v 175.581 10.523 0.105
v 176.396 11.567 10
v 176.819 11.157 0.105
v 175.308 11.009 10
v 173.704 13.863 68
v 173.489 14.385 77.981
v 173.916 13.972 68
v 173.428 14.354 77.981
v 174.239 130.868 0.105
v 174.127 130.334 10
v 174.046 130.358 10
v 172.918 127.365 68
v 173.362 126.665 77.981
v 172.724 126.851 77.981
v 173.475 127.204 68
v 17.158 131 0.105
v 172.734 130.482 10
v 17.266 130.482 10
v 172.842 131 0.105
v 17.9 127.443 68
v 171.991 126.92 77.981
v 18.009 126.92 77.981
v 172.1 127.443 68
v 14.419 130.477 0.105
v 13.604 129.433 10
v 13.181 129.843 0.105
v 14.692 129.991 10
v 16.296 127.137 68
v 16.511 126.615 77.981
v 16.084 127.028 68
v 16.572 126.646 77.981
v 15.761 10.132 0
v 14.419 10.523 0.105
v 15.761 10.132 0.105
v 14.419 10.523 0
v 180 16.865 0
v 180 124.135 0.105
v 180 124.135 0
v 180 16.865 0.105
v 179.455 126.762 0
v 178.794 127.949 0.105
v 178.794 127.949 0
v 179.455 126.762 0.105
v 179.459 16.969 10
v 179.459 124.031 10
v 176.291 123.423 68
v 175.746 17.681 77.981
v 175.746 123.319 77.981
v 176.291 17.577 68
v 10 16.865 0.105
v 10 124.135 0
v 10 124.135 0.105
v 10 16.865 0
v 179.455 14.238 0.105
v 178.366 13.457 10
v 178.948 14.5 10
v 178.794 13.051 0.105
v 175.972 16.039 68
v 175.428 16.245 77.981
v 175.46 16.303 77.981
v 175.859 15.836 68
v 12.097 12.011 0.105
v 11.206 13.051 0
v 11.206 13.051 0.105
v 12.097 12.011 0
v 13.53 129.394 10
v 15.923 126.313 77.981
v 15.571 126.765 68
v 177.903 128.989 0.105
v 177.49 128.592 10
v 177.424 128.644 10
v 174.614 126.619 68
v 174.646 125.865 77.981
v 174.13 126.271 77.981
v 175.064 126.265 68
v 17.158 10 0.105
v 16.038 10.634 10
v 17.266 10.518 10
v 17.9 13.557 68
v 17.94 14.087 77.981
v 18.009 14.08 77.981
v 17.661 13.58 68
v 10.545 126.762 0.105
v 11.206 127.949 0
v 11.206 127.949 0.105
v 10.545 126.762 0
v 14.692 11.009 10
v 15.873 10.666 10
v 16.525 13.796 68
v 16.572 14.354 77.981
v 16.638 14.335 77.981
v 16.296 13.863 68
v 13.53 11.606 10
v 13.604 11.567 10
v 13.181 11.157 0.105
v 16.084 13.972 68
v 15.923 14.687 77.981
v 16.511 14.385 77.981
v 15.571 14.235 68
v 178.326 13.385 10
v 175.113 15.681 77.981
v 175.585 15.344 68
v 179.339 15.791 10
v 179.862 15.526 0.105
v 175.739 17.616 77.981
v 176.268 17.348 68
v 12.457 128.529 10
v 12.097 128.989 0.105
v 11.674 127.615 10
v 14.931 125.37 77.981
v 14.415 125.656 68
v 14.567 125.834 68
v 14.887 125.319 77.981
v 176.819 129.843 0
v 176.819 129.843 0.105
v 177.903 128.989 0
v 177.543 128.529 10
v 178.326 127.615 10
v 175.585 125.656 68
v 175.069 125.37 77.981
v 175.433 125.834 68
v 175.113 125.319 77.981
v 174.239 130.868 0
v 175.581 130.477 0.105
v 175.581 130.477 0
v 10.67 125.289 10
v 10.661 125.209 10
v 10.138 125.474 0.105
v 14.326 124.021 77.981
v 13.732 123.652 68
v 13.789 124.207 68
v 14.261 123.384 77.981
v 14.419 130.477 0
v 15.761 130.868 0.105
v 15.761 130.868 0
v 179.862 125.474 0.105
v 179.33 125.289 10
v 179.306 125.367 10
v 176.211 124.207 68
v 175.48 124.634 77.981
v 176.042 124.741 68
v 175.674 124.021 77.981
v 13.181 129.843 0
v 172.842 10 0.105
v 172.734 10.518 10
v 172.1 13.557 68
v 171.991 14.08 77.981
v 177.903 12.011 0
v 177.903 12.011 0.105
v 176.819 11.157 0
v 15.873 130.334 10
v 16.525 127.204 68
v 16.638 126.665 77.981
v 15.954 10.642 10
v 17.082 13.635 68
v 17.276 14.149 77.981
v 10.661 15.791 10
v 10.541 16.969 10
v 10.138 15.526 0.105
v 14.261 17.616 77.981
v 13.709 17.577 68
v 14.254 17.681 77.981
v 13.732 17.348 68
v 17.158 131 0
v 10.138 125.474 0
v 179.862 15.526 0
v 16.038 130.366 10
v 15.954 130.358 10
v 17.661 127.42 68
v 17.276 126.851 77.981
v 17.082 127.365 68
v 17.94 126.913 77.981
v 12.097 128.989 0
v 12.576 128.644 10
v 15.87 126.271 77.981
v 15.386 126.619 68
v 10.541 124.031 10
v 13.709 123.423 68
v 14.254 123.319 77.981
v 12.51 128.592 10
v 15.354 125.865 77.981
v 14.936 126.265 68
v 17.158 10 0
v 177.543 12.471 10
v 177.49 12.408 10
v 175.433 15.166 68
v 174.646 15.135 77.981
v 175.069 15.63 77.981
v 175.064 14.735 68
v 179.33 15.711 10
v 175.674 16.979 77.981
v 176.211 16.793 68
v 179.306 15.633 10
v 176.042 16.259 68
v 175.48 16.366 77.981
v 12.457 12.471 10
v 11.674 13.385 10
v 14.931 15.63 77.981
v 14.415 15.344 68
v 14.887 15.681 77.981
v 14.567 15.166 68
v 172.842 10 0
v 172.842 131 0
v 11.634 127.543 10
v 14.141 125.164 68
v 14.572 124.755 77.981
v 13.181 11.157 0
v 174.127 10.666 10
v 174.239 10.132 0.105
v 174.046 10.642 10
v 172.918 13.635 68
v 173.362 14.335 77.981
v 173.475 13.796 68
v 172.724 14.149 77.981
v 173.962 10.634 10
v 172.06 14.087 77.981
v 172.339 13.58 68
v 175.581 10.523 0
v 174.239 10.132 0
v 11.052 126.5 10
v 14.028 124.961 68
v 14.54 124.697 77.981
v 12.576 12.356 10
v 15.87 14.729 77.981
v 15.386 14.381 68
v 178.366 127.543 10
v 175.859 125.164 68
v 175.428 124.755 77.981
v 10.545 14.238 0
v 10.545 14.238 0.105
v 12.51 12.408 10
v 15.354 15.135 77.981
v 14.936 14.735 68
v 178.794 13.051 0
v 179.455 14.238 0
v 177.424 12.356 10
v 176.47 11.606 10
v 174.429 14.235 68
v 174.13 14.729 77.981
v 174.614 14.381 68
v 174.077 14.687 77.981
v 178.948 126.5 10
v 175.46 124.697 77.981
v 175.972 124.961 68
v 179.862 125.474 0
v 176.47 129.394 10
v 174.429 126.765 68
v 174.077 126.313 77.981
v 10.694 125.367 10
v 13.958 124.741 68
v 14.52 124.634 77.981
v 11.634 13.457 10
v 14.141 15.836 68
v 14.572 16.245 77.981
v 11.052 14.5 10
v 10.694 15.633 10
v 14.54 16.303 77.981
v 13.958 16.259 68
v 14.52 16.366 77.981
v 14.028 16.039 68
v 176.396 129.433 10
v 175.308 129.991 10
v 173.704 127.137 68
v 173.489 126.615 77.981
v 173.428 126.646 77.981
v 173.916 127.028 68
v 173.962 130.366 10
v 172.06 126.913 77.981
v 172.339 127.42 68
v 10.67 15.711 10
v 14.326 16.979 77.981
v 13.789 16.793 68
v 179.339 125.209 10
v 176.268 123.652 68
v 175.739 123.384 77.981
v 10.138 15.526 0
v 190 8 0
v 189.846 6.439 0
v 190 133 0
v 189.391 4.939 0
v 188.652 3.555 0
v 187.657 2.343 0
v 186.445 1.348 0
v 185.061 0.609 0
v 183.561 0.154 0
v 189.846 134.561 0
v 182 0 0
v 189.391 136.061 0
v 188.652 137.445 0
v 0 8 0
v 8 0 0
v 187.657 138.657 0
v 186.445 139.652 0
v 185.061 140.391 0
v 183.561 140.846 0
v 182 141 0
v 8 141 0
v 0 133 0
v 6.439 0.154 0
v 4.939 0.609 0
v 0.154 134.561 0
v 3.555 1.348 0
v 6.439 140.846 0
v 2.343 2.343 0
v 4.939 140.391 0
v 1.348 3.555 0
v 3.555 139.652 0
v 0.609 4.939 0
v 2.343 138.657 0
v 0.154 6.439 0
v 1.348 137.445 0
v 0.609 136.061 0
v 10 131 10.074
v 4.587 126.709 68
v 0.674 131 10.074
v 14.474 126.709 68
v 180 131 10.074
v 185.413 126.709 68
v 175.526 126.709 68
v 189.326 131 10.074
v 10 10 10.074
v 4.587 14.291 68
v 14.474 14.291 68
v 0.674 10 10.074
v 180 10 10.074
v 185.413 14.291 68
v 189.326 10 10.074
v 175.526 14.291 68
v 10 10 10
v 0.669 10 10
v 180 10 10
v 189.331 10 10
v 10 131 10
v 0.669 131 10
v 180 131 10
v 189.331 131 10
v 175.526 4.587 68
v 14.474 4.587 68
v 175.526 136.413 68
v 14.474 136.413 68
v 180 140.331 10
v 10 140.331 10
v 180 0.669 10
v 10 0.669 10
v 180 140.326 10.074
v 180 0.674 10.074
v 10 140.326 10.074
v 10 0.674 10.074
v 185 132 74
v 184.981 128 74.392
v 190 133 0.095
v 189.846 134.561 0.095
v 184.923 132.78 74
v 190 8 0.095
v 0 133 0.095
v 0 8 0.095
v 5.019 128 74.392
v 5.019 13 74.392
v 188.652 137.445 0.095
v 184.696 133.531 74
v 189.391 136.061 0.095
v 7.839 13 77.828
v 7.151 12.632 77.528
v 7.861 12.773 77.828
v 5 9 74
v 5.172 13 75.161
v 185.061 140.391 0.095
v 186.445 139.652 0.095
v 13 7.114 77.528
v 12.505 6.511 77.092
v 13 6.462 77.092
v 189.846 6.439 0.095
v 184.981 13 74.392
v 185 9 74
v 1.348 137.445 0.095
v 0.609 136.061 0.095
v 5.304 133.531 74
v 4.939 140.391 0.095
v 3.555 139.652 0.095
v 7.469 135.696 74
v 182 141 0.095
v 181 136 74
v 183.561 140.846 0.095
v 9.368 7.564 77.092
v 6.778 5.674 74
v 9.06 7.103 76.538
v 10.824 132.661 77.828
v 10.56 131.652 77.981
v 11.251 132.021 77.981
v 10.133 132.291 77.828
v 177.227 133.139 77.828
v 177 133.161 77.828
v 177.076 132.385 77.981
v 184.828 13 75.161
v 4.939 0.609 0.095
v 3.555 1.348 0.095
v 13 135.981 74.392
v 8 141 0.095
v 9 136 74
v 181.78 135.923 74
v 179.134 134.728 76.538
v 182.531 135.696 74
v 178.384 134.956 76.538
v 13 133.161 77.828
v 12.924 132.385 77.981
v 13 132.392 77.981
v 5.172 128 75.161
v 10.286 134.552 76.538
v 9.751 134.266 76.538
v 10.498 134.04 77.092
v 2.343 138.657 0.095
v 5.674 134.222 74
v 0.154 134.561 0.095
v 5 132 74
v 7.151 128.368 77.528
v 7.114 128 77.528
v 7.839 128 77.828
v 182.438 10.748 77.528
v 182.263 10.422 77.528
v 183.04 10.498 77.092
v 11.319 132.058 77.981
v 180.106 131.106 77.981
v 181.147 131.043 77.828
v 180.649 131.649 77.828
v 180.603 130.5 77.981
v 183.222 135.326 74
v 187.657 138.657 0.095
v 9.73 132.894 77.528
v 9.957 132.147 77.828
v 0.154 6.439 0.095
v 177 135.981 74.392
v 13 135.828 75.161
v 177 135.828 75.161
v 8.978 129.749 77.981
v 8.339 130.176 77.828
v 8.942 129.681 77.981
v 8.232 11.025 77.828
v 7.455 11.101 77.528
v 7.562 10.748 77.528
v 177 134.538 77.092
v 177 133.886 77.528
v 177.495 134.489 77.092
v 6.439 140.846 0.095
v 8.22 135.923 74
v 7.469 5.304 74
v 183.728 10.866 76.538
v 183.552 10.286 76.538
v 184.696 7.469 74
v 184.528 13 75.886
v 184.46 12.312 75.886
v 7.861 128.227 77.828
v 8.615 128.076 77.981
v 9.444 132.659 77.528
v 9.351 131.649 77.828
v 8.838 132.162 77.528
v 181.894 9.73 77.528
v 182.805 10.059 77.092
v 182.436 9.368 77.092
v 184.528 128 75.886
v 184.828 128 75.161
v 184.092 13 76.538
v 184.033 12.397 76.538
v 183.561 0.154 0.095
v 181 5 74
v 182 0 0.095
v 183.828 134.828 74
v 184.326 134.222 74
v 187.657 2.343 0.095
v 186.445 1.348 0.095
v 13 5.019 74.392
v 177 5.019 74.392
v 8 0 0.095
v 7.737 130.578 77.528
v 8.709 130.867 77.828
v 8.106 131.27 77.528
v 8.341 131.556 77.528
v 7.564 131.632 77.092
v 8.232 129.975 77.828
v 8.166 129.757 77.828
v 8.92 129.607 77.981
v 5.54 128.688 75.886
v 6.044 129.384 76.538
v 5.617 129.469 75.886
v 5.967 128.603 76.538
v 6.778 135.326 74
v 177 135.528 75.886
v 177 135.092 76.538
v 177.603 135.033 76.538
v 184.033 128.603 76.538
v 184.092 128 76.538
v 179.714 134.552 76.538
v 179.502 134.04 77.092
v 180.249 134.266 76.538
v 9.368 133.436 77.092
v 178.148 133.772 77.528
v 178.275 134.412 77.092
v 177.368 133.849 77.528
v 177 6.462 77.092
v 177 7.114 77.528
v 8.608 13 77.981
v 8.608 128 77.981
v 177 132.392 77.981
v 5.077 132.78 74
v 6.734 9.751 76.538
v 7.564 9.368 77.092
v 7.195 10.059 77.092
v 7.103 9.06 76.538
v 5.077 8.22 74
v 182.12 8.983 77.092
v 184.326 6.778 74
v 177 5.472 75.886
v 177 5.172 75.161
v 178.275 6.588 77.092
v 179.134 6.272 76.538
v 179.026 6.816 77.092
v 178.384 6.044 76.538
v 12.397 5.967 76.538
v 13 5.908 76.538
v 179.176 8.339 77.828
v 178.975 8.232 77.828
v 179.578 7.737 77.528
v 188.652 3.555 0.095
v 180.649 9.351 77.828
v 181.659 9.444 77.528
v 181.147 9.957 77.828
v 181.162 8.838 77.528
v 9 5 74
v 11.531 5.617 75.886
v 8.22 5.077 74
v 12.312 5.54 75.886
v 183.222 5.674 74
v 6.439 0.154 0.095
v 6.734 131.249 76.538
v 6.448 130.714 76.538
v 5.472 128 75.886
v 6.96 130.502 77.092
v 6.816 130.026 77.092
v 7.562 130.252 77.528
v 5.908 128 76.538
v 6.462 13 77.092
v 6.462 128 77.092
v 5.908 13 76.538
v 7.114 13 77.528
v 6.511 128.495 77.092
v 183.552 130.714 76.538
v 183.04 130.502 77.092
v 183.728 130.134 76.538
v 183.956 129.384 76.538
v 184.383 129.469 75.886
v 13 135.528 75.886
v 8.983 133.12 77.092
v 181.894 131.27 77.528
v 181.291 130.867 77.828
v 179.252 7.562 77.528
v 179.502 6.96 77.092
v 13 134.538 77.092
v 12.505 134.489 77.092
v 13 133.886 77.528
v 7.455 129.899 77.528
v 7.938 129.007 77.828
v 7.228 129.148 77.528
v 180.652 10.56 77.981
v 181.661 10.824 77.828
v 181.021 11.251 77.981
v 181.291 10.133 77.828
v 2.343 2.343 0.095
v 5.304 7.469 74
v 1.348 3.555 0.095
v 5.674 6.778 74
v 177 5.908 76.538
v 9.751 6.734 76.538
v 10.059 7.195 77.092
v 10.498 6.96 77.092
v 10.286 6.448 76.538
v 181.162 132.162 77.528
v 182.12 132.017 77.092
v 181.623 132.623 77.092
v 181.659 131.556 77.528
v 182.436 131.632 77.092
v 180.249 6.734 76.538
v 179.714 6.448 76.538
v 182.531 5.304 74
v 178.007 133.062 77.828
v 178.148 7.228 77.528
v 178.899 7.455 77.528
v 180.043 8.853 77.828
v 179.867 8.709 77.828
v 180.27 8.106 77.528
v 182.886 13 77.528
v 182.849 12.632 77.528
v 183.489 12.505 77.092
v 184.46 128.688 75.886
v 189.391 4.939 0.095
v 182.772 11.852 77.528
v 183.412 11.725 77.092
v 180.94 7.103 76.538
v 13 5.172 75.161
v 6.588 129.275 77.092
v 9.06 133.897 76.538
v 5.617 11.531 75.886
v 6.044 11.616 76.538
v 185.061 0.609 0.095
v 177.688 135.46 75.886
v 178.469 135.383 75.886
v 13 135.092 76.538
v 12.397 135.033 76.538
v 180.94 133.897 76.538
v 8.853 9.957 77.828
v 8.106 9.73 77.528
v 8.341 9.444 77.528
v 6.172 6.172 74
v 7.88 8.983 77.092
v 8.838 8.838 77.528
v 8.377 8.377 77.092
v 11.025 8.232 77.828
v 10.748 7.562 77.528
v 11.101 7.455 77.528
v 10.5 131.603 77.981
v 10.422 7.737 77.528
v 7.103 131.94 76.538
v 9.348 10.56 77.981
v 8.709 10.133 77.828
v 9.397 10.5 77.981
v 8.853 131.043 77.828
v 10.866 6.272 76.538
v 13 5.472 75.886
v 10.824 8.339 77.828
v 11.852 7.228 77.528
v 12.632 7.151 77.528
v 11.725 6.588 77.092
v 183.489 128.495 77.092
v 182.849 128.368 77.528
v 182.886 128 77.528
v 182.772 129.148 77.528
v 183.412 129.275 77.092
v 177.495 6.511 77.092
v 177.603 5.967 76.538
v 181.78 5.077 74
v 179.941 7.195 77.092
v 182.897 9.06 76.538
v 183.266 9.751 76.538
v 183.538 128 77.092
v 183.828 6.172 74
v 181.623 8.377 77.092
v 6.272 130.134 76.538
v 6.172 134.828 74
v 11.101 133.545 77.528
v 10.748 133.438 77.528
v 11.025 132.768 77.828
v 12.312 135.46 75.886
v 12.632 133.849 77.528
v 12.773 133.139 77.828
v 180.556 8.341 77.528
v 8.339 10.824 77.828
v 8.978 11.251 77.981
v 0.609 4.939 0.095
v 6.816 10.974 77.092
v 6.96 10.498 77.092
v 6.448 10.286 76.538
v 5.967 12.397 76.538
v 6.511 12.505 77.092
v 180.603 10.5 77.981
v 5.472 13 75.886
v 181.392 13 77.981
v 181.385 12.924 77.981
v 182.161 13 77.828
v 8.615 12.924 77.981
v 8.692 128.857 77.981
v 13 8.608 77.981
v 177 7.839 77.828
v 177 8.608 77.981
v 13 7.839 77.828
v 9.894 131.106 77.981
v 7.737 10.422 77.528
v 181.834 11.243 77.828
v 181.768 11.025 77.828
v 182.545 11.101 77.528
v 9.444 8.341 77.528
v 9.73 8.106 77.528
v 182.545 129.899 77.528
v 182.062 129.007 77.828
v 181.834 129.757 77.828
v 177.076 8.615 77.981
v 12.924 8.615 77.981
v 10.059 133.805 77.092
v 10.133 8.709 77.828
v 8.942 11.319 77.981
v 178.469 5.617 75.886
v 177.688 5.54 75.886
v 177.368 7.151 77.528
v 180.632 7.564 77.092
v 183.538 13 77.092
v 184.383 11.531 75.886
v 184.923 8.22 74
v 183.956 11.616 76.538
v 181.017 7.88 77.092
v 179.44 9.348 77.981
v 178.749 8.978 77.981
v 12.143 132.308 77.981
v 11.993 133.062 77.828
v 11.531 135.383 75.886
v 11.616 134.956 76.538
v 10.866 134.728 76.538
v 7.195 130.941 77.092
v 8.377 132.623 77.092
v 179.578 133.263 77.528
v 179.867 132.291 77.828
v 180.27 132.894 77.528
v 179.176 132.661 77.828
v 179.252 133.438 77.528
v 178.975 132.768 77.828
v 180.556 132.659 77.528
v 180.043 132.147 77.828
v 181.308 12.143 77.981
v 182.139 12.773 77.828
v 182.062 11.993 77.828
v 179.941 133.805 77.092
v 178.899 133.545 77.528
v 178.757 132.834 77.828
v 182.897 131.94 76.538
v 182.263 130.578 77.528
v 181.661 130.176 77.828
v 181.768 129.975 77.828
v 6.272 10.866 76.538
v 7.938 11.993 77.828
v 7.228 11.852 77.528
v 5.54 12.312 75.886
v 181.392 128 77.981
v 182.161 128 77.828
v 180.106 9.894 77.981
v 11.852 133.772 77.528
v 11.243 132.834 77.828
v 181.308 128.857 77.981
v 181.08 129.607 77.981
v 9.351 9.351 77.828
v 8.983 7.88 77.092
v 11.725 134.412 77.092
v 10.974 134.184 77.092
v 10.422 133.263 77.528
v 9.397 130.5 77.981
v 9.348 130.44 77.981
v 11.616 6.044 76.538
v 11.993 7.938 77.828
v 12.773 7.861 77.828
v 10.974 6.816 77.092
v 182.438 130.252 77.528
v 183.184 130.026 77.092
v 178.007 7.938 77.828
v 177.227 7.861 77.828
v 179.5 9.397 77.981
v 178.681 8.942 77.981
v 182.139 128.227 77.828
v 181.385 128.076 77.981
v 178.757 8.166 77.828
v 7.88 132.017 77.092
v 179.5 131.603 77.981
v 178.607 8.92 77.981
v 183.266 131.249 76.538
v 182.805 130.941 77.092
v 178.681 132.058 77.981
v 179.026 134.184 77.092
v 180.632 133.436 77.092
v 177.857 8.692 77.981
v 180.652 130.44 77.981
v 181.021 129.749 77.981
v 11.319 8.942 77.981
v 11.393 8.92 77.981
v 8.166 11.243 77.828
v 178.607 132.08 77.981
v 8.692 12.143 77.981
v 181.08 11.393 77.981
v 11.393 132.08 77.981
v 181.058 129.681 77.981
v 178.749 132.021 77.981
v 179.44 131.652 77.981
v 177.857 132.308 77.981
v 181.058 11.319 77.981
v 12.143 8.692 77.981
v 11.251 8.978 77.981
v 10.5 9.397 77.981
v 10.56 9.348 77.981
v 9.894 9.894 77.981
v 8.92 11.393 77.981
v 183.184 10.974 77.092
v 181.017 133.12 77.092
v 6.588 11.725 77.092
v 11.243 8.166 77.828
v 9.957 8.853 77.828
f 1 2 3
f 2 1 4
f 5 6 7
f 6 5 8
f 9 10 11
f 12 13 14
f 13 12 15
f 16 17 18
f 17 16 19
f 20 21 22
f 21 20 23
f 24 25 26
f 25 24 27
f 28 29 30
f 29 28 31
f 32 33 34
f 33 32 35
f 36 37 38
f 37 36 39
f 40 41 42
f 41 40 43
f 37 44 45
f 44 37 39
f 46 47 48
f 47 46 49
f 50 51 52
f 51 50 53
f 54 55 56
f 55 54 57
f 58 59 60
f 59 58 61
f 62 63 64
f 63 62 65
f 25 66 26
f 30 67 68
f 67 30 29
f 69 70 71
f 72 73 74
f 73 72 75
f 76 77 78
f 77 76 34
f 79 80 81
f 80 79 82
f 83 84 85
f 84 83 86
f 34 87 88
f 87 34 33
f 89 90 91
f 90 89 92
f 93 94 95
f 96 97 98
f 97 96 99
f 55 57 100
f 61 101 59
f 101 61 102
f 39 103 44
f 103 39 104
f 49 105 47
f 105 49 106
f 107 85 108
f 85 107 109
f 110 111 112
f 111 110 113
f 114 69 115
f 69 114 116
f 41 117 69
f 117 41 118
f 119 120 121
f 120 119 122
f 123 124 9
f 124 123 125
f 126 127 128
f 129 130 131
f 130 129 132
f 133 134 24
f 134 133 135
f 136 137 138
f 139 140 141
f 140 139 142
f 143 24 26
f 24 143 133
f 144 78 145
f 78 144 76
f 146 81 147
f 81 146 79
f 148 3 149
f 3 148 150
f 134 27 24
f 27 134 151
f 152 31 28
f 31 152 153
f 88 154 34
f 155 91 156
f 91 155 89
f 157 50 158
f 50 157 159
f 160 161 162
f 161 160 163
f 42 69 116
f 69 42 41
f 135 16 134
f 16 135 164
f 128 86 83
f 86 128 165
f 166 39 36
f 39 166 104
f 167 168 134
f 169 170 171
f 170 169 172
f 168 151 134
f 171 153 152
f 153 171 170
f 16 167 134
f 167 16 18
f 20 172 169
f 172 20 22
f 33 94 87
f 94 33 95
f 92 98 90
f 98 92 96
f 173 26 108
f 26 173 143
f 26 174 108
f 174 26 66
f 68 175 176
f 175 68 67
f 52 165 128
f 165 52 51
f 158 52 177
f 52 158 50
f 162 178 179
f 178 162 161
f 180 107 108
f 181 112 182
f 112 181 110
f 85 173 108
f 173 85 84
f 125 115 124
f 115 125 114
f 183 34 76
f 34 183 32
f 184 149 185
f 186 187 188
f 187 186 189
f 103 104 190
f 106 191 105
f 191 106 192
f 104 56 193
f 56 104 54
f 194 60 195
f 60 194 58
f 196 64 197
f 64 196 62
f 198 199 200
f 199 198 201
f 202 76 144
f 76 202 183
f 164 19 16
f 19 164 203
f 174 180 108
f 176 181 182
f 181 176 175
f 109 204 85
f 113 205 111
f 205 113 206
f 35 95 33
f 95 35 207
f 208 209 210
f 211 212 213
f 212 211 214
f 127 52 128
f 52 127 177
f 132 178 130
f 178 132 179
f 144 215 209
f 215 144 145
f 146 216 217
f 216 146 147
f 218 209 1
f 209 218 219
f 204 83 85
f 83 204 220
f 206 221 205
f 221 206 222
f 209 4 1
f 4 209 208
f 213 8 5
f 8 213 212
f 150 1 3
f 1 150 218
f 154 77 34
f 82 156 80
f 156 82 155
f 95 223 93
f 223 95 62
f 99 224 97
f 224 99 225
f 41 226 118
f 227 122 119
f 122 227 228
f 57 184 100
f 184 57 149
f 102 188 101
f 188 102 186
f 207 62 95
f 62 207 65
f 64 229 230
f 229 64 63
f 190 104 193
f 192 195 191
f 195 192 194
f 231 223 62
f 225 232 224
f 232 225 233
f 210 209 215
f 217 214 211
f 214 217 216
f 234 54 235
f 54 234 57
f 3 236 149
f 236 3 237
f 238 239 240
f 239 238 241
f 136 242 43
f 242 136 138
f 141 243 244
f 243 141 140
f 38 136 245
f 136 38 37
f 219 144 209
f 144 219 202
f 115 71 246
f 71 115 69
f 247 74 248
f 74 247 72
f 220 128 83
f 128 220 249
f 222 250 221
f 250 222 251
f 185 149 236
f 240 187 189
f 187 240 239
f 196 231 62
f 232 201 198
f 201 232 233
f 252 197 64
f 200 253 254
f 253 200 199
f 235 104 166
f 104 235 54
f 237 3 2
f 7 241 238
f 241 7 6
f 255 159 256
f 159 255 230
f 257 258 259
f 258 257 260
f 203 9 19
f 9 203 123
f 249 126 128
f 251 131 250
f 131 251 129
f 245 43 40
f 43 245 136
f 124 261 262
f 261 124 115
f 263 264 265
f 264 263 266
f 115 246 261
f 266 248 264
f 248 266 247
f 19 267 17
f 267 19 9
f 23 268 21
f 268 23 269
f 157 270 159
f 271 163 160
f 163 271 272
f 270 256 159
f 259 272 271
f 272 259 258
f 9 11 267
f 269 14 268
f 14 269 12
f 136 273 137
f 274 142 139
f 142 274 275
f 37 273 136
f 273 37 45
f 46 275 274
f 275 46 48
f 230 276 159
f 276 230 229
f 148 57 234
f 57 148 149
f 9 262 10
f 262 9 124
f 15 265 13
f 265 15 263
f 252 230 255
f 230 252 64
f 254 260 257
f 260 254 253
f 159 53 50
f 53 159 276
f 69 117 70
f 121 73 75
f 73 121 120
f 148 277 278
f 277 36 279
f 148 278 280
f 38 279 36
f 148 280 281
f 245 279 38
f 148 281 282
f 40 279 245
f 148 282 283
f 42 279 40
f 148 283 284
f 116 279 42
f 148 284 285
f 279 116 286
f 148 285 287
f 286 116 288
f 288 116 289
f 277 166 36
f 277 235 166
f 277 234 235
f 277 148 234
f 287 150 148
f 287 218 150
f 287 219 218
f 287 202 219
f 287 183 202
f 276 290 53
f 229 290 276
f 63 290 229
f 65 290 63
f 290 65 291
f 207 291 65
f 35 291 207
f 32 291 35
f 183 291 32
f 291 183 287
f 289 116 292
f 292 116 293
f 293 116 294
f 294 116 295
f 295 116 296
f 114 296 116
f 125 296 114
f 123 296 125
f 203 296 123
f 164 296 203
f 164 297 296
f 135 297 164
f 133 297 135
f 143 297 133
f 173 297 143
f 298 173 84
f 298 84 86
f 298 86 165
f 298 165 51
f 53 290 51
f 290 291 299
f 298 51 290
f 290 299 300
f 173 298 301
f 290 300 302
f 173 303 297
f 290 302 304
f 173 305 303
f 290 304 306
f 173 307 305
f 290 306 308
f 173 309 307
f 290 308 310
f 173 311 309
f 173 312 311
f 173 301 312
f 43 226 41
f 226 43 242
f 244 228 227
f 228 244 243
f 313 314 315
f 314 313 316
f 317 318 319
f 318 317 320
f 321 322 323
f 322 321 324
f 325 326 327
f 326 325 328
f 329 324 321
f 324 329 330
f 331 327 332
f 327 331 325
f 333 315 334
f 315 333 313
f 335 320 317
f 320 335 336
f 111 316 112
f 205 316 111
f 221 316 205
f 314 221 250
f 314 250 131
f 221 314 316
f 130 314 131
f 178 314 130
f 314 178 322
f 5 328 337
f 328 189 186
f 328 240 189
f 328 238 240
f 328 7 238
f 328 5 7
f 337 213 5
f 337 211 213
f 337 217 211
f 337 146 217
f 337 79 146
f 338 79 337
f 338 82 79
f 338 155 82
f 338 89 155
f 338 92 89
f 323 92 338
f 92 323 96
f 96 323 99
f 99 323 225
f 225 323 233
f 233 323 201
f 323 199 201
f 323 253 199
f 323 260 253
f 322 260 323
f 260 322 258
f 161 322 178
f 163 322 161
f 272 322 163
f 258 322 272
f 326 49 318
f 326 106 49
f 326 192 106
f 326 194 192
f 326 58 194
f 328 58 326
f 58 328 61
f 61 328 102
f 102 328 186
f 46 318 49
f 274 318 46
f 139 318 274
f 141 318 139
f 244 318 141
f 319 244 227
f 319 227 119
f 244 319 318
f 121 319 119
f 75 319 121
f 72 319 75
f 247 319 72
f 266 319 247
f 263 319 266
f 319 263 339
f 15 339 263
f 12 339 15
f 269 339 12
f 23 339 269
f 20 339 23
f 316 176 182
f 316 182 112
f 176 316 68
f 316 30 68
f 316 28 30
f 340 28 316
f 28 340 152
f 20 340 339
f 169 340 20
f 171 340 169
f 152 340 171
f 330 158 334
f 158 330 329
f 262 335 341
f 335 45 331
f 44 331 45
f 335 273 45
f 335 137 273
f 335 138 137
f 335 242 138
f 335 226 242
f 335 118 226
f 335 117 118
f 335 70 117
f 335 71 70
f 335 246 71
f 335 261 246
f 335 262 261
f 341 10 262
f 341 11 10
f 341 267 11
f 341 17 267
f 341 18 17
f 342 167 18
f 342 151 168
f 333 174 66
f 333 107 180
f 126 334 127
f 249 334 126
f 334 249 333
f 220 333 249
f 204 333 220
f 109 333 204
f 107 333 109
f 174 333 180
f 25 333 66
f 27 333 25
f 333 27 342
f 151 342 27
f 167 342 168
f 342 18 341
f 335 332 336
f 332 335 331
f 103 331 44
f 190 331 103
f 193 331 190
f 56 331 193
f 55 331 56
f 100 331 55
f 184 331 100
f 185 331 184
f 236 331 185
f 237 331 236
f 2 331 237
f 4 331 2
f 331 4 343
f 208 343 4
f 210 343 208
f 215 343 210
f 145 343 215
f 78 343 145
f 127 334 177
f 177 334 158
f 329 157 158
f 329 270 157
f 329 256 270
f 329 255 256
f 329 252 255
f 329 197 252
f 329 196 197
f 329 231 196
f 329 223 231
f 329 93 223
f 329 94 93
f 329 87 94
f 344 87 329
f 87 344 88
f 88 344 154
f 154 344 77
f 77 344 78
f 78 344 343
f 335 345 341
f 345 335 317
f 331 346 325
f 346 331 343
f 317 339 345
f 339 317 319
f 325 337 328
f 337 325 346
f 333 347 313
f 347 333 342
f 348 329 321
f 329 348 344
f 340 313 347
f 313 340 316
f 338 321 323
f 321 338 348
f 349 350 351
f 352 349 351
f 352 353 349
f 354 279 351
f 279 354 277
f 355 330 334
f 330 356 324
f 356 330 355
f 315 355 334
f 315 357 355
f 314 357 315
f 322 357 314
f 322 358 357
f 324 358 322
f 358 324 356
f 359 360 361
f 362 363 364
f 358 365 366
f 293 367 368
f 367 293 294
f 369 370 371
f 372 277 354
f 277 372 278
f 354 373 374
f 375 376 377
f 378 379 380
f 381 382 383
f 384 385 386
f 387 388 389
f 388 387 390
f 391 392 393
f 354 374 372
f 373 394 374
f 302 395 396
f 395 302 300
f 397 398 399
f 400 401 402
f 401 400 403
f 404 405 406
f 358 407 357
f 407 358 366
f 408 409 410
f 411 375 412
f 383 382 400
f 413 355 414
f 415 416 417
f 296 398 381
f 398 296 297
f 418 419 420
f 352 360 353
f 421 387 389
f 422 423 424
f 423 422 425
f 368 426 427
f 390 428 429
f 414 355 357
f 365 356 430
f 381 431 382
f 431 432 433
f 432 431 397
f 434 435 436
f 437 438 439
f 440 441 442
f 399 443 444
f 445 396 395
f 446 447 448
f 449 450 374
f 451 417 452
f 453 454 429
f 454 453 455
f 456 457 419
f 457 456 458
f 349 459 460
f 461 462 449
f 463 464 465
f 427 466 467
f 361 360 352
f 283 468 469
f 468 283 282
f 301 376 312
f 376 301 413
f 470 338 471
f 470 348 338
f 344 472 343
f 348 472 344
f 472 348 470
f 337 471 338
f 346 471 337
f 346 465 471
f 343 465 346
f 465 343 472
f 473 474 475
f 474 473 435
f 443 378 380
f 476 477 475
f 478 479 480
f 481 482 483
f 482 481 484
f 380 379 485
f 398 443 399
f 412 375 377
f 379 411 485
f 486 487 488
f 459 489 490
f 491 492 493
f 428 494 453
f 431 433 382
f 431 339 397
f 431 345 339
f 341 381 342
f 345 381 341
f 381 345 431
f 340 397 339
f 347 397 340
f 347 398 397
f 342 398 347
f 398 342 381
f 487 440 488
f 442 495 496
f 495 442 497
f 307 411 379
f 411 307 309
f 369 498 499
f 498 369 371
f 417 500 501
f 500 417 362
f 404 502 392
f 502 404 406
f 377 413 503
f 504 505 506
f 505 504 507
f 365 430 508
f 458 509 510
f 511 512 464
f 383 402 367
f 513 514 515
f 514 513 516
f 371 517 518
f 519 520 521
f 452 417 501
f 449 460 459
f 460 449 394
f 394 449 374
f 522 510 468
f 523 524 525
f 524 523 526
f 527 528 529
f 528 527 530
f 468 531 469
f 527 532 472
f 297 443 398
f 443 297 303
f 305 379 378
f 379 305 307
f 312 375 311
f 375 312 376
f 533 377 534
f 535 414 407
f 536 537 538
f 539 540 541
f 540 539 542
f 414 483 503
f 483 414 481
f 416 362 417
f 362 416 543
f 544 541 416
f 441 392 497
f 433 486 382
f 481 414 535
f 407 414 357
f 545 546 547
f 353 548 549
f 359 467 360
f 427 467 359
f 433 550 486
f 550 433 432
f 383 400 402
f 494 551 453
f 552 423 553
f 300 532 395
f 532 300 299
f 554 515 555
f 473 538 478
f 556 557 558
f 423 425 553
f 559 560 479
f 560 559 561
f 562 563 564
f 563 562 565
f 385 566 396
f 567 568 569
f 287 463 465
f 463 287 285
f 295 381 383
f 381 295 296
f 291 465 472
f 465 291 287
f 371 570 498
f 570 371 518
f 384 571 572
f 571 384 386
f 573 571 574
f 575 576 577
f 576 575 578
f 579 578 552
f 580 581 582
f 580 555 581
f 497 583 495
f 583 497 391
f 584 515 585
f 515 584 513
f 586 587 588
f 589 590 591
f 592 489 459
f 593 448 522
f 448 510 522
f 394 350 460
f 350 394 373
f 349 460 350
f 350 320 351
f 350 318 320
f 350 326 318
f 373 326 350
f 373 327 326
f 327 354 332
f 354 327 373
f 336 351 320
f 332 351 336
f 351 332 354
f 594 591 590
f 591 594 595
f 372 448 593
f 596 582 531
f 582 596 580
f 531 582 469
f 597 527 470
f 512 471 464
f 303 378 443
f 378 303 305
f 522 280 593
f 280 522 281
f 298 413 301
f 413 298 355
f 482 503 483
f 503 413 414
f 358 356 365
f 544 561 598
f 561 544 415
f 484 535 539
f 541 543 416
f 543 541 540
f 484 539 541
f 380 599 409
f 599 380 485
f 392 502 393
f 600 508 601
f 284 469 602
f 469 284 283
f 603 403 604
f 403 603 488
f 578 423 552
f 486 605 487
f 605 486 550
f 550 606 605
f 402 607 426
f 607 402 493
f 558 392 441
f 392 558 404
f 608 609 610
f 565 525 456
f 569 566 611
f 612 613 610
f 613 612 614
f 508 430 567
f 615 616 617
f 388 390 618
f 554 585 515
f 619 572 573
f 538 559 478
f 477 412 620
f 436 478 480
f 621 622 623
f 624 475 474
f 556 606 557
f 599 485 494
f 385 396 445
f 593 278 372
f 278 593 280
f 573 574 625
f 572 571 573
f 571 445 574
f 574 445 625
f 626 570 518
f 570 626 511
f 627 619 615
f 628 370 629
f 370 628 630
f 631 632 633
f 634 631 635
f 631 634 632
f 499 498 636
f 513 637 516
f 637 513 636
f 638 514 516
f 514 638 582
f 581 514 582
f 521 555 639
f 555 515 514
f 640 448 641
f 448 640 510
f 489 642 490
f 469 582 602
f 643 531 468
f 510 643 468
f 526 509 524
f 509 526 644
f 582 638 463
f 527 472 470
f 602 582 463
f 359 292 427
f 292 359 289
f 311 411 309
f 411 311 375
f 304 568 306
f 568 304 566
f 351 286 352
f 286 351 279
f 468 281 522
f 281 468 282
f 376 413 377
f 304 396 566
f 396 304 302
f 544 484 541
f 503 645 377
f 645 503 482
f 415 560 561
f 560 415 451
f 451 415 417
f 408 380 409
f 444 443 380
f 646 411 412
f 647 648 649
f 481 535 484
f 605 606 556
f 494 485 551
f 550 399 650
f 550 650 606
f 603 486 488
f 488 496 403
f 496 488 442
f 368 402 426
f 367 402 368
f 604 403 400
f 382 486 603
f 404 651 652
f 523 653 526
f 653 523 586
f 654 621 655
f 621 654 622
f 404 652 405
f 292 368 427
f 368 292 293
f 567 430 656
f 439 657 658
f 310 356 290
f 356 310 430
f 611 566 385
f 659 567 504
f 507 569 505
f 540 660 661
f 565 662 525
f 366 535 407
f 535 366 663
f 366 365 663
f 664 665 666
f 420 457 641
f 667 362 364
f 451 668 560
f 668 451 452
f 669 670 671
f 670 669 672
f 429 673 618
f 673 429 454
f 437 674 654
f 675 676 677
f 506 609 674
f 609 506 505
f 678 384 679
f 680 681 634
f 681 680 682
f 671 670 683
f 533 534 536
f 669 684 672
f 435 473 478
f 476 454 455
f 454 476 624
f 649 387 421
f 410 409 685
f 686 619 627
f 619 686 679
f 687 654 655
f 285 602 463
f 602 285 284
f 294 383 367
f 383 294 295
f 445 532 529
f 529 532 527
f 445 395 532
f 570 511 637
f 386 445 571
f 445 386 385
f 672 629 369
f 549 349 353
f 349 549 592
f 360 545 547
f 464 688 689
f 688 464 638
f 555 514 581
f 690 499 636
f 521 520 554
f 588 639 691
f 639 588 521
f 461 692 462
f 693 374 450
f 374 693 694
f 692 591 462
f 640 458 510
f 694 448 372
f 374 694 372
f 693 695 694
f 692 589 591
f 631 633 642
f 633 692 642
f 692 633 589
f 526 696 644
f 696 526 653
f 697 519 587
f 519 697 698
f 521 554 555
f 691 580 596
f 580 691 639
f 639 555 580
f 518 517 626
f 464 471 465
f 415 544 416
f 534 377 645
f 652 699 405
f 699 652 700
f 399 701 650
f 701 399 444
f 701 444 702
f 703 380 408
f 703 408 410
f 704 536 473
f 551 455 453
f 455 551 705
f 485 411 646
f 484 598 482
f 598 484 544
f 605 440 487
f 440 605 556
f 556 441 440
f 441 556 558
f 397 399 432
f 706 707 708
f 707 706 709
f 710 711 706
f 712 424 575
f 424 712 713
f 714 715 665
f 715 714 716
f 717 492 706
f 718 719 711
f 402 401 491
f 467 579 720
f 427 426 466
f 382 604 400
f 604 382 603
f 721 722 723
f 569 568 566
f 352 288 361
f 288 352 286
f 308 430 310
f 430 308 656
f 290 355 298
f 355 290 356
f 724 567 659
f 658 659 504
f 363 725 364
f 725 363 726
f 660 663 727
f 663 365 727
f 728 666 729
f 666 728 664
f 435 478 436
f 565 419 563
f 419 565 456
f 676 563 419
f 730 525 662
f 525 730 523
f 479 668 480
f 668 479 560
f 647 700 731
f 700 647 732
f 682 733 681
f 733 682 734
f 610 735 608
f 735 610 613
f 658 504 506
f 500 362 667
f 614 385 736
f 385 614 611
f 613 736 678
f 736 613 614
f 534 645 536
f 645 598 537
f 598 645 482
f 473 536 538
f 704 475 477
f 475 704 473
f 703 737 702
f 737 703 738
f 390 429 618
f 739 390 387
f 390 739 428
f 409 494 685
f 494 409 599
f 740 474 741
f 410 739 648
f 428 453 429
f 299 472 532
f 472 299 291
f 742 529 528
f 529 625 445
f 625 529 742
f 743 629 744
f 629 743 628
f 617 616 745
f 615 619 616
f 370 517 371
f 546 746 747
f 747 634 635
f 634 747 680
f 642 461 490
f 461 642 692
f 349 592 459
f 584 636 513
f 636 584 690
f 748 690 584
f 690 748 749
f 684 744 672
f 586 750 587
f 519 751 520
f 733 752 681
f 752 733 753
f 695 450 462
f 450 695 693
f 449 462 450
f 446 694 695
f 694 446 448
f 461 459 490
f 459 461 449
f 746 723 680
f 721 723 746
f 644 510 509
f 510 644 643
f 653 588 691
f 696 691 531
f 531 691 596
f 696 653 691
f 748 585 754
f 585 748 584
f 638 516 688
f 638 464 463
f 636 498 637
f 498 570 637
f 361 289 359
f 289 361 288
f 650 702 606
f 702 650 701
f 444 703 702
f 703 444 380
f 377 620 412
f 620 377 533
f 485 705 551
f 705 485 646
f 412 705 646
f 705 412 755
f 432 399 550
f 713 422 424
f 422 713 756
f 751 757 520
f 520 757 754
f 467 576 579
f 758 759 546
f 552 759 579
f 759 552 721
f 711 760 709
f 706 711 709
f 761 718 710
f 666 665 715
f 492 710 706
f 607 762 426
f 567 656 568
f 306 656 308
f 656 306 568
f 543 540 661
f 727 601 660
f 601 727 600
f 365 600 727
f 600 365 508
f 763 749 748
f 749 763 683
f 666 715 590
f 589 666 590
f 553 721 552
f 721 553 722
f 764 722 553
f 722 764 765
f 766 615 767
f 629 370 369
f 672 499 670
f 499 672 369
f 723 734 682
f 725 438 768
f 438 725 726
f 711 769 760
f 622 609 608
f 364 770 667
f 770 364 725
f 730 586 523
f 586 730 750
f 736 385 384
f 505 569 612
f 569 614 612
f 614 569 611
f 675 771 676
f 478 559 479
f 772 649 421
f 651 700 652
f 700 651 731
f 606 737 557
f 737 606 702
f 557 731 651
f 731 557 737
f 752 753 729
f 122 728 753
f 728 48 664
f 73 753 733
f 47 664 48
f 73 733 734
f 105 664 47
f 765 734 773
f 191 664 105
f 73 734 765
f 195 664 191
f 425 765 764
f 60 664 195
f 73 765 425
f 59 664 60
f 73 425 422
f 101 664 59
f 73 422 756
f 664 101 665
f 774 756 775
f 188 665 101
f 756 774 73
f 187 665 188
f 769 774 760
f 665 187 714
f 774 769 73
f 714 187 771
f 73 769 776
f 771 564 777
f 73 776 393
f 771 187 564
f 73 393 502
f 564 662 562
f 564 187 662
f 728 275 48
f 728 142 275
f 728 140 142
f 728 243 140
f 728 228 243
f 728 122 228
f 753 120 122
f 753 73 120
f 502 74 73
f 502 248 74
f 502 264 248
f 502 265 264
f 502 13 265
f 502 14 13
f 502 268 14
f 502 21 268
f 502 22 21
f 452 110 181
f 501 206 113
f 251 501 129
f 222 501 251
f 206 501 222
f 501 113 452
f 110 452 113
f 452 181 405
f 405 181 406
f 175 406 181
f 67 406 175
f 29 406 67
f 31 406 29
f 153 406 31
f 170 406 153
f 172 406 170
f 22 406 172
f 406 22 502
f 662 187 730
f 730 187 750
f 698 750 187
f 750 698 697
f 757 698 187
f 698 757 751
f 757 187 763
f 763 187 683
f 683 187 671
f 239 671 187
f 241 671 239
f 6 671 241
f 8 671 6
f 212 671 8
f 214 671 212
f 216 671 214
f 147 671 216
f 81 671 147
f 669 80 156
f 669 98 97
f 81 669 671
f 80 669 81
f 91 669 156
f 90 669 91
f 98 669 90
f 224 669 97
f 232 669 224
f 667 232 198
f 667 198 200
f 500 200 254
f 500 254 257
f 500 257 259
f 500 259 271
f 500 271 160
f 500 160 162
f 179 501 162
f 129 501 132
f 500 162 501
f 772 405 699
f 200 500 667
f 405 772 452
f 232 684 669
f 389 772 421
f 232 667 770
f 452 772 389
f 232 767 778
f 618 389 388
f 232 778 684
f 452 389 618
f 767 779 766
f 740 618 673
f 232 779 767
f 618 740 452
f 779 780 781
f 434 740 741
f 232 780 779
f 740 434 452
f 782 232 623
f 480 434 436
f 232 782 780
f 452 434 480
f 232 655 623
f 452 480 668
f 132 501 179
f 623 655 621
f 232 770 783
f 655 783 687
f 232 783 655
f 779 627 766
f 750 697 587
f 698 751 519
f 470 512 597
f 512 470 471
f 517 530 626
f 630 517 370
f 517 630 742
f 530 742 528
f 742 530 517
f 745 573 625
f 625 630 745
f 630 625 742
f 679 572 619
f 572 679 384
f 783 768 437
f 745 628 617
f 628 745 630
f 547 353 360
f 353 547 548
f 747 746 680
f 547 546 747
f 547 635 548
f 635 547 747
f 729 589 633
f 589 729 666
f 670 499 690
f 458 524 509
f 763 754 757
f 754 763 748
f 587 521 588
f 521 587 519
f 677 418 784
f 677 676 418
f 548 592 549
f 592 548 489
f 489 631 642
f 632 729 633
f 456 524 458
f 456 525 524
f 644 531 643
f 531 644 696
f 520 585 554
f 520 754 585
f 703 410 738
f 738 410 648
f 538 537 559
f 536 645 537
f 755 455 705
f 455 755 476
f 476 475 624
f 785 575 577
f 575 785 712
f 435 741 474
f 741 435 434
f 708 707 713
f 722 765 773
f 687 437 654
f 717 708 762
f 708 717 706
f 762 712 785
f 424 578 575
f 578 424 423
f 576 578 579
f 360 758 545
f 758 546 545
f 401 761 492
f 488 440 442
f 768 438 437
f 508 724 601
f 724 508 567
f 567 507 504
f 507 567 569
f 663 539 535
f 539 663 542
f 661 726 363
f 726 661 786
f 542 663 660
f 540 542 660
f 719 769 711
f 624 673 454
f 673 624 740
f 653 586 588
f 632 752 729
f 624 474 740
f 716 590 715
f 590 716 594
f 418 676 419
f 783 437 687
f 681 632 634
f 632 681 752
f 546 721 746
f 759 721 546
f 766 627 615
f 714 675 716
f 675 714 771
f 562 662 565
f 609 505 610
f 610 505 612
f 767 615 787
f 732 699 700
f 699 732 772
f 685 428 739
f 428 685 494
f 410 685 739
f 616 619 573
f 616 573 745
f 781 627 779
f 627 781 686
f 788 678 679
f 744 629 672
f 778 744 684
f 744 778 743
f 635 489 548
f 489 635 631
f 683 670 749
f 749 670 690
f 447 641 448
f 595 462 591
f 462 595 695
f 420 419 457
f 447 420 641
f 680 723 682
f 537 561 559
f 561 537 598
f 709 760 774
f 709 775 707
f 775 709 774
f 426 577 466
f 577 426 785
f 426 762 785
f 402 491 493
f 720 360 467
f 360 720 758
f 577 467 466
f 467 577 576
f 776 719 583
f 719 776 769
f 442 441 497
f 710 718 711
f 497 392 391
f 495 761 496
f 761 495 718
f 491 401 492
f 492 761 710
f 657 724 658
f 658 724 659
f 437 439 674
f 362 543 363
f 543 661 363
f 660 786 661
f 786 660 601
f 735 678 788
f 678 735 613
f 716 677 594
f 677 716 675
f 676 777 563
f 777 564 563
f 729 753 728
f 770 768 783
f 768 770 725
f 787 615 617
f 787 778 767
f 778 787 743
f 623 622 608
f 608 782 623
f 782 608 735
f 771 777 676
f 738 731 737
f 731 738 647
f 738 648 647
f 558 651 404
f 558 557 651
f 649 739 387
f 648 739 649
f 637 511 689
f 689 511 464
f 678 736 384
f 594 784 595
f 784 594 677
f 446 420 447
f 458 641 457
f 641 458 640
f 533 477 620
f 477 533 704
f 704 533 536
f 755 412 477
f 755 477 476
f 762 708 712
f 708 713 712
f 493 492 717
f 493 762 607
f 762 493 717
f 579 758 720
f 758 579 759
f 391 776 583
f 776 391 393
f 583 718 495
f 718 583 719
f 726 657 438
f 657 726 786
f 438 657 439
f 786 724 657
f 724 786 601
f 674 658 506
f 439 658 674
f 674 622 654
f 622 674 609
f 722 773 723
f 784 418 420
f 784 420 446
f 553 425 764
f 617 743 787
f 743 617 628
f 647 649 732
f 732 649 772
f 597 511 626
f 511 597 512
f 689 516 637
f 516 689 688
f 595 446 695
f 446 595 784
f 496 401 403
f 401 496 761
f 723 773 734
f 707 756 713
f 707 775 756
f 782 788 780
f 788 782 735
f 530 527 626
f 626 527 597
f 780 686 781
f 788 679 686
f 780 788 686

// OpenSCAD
$fn=32;

dim_case_top        = [190,141];
dim_case_bottom     = [180,131];
height_case         = 78;
mki_case_top        = 8;
mki_case_bottom     = 4;

wide_caseframe      = 10;


module rd_square(dimension,minkowski_value){
    translate([minkowski_value,minkowski_value,0]){
        minkowski() {
                square(dimension-2*[minkowski_value,minkowski_value]);
                circle(minkowski_value);
        }
    }
}

difference(){
    caseshape();
    frame_cutout();
}


module frame_cutout(){
    // top/bottom cutout
    translate([wide_caseframe,wide_caseframe,0]){
        resize(newsize=[dim_case_top[0]-2*wide_caseframe,
                         dim_case_top[1]-2*wide_caseframe,
                         height_case+mki_case_bottom]) frame1();
    }

    // x cutout
    translate([-wide_caseframe,wide_caseframe,wide_caseframe]){
        resize(newsize=[dim_case_top[0]+2*wide_caseframe,
                         dim_case_top[1]-2*wide_caseframe,
                         height_case-2*wide_caseframe]) frame1();
    }

    // y cutout
    translate([wide_caseframe,-wide_caseframe,wide_caseframe]){
        resize(newsize=[dim_case_top[0]-2*wide_caseframe,
                         dim_case_top[1]+2*wide_caseframe,
                         height_case-2*wide_caseframe]) frame1();
    }
}

module frame1() {
    hull(){
        //top square
        linear_extrude(0.1)
            rd_square(dim_case_top,mki_case_top);

        //bottom_square
        translate([(dim_case_top[0]-dim_case_bottom[0])/2,
                   (dim_case_top[1]-dim_case_bottom[1])/2,
                   height_case-0.1])
            linear_extrude(0.1)
                rd_square(dim_case_bottom,mki_case_bottom);    
    }
}

module caseshape(){
    hull(){

        resize(newsize=[0,0,height_case-mki_case_bottom]) frame1();
        // bottom minkowsi
        translate([(dim_case_top[0]-dim_case_bottom[0])/2+mki_case_bottom,
                   (dim_case_top[1]-dim_case_bottom[1])/2+mki_case_bottom,
                   height_case-mki_case_bottom-0.1]){
            minkowski(){
                linear_extrude(0.1){                
                    rd_square(dim_case_bottom-2*[mki_case_bottom,mki_case_bottom],
                              mki_case_bottom);
                }
                sphere(mki_case_bottom);
            }
        }
    }   
}
